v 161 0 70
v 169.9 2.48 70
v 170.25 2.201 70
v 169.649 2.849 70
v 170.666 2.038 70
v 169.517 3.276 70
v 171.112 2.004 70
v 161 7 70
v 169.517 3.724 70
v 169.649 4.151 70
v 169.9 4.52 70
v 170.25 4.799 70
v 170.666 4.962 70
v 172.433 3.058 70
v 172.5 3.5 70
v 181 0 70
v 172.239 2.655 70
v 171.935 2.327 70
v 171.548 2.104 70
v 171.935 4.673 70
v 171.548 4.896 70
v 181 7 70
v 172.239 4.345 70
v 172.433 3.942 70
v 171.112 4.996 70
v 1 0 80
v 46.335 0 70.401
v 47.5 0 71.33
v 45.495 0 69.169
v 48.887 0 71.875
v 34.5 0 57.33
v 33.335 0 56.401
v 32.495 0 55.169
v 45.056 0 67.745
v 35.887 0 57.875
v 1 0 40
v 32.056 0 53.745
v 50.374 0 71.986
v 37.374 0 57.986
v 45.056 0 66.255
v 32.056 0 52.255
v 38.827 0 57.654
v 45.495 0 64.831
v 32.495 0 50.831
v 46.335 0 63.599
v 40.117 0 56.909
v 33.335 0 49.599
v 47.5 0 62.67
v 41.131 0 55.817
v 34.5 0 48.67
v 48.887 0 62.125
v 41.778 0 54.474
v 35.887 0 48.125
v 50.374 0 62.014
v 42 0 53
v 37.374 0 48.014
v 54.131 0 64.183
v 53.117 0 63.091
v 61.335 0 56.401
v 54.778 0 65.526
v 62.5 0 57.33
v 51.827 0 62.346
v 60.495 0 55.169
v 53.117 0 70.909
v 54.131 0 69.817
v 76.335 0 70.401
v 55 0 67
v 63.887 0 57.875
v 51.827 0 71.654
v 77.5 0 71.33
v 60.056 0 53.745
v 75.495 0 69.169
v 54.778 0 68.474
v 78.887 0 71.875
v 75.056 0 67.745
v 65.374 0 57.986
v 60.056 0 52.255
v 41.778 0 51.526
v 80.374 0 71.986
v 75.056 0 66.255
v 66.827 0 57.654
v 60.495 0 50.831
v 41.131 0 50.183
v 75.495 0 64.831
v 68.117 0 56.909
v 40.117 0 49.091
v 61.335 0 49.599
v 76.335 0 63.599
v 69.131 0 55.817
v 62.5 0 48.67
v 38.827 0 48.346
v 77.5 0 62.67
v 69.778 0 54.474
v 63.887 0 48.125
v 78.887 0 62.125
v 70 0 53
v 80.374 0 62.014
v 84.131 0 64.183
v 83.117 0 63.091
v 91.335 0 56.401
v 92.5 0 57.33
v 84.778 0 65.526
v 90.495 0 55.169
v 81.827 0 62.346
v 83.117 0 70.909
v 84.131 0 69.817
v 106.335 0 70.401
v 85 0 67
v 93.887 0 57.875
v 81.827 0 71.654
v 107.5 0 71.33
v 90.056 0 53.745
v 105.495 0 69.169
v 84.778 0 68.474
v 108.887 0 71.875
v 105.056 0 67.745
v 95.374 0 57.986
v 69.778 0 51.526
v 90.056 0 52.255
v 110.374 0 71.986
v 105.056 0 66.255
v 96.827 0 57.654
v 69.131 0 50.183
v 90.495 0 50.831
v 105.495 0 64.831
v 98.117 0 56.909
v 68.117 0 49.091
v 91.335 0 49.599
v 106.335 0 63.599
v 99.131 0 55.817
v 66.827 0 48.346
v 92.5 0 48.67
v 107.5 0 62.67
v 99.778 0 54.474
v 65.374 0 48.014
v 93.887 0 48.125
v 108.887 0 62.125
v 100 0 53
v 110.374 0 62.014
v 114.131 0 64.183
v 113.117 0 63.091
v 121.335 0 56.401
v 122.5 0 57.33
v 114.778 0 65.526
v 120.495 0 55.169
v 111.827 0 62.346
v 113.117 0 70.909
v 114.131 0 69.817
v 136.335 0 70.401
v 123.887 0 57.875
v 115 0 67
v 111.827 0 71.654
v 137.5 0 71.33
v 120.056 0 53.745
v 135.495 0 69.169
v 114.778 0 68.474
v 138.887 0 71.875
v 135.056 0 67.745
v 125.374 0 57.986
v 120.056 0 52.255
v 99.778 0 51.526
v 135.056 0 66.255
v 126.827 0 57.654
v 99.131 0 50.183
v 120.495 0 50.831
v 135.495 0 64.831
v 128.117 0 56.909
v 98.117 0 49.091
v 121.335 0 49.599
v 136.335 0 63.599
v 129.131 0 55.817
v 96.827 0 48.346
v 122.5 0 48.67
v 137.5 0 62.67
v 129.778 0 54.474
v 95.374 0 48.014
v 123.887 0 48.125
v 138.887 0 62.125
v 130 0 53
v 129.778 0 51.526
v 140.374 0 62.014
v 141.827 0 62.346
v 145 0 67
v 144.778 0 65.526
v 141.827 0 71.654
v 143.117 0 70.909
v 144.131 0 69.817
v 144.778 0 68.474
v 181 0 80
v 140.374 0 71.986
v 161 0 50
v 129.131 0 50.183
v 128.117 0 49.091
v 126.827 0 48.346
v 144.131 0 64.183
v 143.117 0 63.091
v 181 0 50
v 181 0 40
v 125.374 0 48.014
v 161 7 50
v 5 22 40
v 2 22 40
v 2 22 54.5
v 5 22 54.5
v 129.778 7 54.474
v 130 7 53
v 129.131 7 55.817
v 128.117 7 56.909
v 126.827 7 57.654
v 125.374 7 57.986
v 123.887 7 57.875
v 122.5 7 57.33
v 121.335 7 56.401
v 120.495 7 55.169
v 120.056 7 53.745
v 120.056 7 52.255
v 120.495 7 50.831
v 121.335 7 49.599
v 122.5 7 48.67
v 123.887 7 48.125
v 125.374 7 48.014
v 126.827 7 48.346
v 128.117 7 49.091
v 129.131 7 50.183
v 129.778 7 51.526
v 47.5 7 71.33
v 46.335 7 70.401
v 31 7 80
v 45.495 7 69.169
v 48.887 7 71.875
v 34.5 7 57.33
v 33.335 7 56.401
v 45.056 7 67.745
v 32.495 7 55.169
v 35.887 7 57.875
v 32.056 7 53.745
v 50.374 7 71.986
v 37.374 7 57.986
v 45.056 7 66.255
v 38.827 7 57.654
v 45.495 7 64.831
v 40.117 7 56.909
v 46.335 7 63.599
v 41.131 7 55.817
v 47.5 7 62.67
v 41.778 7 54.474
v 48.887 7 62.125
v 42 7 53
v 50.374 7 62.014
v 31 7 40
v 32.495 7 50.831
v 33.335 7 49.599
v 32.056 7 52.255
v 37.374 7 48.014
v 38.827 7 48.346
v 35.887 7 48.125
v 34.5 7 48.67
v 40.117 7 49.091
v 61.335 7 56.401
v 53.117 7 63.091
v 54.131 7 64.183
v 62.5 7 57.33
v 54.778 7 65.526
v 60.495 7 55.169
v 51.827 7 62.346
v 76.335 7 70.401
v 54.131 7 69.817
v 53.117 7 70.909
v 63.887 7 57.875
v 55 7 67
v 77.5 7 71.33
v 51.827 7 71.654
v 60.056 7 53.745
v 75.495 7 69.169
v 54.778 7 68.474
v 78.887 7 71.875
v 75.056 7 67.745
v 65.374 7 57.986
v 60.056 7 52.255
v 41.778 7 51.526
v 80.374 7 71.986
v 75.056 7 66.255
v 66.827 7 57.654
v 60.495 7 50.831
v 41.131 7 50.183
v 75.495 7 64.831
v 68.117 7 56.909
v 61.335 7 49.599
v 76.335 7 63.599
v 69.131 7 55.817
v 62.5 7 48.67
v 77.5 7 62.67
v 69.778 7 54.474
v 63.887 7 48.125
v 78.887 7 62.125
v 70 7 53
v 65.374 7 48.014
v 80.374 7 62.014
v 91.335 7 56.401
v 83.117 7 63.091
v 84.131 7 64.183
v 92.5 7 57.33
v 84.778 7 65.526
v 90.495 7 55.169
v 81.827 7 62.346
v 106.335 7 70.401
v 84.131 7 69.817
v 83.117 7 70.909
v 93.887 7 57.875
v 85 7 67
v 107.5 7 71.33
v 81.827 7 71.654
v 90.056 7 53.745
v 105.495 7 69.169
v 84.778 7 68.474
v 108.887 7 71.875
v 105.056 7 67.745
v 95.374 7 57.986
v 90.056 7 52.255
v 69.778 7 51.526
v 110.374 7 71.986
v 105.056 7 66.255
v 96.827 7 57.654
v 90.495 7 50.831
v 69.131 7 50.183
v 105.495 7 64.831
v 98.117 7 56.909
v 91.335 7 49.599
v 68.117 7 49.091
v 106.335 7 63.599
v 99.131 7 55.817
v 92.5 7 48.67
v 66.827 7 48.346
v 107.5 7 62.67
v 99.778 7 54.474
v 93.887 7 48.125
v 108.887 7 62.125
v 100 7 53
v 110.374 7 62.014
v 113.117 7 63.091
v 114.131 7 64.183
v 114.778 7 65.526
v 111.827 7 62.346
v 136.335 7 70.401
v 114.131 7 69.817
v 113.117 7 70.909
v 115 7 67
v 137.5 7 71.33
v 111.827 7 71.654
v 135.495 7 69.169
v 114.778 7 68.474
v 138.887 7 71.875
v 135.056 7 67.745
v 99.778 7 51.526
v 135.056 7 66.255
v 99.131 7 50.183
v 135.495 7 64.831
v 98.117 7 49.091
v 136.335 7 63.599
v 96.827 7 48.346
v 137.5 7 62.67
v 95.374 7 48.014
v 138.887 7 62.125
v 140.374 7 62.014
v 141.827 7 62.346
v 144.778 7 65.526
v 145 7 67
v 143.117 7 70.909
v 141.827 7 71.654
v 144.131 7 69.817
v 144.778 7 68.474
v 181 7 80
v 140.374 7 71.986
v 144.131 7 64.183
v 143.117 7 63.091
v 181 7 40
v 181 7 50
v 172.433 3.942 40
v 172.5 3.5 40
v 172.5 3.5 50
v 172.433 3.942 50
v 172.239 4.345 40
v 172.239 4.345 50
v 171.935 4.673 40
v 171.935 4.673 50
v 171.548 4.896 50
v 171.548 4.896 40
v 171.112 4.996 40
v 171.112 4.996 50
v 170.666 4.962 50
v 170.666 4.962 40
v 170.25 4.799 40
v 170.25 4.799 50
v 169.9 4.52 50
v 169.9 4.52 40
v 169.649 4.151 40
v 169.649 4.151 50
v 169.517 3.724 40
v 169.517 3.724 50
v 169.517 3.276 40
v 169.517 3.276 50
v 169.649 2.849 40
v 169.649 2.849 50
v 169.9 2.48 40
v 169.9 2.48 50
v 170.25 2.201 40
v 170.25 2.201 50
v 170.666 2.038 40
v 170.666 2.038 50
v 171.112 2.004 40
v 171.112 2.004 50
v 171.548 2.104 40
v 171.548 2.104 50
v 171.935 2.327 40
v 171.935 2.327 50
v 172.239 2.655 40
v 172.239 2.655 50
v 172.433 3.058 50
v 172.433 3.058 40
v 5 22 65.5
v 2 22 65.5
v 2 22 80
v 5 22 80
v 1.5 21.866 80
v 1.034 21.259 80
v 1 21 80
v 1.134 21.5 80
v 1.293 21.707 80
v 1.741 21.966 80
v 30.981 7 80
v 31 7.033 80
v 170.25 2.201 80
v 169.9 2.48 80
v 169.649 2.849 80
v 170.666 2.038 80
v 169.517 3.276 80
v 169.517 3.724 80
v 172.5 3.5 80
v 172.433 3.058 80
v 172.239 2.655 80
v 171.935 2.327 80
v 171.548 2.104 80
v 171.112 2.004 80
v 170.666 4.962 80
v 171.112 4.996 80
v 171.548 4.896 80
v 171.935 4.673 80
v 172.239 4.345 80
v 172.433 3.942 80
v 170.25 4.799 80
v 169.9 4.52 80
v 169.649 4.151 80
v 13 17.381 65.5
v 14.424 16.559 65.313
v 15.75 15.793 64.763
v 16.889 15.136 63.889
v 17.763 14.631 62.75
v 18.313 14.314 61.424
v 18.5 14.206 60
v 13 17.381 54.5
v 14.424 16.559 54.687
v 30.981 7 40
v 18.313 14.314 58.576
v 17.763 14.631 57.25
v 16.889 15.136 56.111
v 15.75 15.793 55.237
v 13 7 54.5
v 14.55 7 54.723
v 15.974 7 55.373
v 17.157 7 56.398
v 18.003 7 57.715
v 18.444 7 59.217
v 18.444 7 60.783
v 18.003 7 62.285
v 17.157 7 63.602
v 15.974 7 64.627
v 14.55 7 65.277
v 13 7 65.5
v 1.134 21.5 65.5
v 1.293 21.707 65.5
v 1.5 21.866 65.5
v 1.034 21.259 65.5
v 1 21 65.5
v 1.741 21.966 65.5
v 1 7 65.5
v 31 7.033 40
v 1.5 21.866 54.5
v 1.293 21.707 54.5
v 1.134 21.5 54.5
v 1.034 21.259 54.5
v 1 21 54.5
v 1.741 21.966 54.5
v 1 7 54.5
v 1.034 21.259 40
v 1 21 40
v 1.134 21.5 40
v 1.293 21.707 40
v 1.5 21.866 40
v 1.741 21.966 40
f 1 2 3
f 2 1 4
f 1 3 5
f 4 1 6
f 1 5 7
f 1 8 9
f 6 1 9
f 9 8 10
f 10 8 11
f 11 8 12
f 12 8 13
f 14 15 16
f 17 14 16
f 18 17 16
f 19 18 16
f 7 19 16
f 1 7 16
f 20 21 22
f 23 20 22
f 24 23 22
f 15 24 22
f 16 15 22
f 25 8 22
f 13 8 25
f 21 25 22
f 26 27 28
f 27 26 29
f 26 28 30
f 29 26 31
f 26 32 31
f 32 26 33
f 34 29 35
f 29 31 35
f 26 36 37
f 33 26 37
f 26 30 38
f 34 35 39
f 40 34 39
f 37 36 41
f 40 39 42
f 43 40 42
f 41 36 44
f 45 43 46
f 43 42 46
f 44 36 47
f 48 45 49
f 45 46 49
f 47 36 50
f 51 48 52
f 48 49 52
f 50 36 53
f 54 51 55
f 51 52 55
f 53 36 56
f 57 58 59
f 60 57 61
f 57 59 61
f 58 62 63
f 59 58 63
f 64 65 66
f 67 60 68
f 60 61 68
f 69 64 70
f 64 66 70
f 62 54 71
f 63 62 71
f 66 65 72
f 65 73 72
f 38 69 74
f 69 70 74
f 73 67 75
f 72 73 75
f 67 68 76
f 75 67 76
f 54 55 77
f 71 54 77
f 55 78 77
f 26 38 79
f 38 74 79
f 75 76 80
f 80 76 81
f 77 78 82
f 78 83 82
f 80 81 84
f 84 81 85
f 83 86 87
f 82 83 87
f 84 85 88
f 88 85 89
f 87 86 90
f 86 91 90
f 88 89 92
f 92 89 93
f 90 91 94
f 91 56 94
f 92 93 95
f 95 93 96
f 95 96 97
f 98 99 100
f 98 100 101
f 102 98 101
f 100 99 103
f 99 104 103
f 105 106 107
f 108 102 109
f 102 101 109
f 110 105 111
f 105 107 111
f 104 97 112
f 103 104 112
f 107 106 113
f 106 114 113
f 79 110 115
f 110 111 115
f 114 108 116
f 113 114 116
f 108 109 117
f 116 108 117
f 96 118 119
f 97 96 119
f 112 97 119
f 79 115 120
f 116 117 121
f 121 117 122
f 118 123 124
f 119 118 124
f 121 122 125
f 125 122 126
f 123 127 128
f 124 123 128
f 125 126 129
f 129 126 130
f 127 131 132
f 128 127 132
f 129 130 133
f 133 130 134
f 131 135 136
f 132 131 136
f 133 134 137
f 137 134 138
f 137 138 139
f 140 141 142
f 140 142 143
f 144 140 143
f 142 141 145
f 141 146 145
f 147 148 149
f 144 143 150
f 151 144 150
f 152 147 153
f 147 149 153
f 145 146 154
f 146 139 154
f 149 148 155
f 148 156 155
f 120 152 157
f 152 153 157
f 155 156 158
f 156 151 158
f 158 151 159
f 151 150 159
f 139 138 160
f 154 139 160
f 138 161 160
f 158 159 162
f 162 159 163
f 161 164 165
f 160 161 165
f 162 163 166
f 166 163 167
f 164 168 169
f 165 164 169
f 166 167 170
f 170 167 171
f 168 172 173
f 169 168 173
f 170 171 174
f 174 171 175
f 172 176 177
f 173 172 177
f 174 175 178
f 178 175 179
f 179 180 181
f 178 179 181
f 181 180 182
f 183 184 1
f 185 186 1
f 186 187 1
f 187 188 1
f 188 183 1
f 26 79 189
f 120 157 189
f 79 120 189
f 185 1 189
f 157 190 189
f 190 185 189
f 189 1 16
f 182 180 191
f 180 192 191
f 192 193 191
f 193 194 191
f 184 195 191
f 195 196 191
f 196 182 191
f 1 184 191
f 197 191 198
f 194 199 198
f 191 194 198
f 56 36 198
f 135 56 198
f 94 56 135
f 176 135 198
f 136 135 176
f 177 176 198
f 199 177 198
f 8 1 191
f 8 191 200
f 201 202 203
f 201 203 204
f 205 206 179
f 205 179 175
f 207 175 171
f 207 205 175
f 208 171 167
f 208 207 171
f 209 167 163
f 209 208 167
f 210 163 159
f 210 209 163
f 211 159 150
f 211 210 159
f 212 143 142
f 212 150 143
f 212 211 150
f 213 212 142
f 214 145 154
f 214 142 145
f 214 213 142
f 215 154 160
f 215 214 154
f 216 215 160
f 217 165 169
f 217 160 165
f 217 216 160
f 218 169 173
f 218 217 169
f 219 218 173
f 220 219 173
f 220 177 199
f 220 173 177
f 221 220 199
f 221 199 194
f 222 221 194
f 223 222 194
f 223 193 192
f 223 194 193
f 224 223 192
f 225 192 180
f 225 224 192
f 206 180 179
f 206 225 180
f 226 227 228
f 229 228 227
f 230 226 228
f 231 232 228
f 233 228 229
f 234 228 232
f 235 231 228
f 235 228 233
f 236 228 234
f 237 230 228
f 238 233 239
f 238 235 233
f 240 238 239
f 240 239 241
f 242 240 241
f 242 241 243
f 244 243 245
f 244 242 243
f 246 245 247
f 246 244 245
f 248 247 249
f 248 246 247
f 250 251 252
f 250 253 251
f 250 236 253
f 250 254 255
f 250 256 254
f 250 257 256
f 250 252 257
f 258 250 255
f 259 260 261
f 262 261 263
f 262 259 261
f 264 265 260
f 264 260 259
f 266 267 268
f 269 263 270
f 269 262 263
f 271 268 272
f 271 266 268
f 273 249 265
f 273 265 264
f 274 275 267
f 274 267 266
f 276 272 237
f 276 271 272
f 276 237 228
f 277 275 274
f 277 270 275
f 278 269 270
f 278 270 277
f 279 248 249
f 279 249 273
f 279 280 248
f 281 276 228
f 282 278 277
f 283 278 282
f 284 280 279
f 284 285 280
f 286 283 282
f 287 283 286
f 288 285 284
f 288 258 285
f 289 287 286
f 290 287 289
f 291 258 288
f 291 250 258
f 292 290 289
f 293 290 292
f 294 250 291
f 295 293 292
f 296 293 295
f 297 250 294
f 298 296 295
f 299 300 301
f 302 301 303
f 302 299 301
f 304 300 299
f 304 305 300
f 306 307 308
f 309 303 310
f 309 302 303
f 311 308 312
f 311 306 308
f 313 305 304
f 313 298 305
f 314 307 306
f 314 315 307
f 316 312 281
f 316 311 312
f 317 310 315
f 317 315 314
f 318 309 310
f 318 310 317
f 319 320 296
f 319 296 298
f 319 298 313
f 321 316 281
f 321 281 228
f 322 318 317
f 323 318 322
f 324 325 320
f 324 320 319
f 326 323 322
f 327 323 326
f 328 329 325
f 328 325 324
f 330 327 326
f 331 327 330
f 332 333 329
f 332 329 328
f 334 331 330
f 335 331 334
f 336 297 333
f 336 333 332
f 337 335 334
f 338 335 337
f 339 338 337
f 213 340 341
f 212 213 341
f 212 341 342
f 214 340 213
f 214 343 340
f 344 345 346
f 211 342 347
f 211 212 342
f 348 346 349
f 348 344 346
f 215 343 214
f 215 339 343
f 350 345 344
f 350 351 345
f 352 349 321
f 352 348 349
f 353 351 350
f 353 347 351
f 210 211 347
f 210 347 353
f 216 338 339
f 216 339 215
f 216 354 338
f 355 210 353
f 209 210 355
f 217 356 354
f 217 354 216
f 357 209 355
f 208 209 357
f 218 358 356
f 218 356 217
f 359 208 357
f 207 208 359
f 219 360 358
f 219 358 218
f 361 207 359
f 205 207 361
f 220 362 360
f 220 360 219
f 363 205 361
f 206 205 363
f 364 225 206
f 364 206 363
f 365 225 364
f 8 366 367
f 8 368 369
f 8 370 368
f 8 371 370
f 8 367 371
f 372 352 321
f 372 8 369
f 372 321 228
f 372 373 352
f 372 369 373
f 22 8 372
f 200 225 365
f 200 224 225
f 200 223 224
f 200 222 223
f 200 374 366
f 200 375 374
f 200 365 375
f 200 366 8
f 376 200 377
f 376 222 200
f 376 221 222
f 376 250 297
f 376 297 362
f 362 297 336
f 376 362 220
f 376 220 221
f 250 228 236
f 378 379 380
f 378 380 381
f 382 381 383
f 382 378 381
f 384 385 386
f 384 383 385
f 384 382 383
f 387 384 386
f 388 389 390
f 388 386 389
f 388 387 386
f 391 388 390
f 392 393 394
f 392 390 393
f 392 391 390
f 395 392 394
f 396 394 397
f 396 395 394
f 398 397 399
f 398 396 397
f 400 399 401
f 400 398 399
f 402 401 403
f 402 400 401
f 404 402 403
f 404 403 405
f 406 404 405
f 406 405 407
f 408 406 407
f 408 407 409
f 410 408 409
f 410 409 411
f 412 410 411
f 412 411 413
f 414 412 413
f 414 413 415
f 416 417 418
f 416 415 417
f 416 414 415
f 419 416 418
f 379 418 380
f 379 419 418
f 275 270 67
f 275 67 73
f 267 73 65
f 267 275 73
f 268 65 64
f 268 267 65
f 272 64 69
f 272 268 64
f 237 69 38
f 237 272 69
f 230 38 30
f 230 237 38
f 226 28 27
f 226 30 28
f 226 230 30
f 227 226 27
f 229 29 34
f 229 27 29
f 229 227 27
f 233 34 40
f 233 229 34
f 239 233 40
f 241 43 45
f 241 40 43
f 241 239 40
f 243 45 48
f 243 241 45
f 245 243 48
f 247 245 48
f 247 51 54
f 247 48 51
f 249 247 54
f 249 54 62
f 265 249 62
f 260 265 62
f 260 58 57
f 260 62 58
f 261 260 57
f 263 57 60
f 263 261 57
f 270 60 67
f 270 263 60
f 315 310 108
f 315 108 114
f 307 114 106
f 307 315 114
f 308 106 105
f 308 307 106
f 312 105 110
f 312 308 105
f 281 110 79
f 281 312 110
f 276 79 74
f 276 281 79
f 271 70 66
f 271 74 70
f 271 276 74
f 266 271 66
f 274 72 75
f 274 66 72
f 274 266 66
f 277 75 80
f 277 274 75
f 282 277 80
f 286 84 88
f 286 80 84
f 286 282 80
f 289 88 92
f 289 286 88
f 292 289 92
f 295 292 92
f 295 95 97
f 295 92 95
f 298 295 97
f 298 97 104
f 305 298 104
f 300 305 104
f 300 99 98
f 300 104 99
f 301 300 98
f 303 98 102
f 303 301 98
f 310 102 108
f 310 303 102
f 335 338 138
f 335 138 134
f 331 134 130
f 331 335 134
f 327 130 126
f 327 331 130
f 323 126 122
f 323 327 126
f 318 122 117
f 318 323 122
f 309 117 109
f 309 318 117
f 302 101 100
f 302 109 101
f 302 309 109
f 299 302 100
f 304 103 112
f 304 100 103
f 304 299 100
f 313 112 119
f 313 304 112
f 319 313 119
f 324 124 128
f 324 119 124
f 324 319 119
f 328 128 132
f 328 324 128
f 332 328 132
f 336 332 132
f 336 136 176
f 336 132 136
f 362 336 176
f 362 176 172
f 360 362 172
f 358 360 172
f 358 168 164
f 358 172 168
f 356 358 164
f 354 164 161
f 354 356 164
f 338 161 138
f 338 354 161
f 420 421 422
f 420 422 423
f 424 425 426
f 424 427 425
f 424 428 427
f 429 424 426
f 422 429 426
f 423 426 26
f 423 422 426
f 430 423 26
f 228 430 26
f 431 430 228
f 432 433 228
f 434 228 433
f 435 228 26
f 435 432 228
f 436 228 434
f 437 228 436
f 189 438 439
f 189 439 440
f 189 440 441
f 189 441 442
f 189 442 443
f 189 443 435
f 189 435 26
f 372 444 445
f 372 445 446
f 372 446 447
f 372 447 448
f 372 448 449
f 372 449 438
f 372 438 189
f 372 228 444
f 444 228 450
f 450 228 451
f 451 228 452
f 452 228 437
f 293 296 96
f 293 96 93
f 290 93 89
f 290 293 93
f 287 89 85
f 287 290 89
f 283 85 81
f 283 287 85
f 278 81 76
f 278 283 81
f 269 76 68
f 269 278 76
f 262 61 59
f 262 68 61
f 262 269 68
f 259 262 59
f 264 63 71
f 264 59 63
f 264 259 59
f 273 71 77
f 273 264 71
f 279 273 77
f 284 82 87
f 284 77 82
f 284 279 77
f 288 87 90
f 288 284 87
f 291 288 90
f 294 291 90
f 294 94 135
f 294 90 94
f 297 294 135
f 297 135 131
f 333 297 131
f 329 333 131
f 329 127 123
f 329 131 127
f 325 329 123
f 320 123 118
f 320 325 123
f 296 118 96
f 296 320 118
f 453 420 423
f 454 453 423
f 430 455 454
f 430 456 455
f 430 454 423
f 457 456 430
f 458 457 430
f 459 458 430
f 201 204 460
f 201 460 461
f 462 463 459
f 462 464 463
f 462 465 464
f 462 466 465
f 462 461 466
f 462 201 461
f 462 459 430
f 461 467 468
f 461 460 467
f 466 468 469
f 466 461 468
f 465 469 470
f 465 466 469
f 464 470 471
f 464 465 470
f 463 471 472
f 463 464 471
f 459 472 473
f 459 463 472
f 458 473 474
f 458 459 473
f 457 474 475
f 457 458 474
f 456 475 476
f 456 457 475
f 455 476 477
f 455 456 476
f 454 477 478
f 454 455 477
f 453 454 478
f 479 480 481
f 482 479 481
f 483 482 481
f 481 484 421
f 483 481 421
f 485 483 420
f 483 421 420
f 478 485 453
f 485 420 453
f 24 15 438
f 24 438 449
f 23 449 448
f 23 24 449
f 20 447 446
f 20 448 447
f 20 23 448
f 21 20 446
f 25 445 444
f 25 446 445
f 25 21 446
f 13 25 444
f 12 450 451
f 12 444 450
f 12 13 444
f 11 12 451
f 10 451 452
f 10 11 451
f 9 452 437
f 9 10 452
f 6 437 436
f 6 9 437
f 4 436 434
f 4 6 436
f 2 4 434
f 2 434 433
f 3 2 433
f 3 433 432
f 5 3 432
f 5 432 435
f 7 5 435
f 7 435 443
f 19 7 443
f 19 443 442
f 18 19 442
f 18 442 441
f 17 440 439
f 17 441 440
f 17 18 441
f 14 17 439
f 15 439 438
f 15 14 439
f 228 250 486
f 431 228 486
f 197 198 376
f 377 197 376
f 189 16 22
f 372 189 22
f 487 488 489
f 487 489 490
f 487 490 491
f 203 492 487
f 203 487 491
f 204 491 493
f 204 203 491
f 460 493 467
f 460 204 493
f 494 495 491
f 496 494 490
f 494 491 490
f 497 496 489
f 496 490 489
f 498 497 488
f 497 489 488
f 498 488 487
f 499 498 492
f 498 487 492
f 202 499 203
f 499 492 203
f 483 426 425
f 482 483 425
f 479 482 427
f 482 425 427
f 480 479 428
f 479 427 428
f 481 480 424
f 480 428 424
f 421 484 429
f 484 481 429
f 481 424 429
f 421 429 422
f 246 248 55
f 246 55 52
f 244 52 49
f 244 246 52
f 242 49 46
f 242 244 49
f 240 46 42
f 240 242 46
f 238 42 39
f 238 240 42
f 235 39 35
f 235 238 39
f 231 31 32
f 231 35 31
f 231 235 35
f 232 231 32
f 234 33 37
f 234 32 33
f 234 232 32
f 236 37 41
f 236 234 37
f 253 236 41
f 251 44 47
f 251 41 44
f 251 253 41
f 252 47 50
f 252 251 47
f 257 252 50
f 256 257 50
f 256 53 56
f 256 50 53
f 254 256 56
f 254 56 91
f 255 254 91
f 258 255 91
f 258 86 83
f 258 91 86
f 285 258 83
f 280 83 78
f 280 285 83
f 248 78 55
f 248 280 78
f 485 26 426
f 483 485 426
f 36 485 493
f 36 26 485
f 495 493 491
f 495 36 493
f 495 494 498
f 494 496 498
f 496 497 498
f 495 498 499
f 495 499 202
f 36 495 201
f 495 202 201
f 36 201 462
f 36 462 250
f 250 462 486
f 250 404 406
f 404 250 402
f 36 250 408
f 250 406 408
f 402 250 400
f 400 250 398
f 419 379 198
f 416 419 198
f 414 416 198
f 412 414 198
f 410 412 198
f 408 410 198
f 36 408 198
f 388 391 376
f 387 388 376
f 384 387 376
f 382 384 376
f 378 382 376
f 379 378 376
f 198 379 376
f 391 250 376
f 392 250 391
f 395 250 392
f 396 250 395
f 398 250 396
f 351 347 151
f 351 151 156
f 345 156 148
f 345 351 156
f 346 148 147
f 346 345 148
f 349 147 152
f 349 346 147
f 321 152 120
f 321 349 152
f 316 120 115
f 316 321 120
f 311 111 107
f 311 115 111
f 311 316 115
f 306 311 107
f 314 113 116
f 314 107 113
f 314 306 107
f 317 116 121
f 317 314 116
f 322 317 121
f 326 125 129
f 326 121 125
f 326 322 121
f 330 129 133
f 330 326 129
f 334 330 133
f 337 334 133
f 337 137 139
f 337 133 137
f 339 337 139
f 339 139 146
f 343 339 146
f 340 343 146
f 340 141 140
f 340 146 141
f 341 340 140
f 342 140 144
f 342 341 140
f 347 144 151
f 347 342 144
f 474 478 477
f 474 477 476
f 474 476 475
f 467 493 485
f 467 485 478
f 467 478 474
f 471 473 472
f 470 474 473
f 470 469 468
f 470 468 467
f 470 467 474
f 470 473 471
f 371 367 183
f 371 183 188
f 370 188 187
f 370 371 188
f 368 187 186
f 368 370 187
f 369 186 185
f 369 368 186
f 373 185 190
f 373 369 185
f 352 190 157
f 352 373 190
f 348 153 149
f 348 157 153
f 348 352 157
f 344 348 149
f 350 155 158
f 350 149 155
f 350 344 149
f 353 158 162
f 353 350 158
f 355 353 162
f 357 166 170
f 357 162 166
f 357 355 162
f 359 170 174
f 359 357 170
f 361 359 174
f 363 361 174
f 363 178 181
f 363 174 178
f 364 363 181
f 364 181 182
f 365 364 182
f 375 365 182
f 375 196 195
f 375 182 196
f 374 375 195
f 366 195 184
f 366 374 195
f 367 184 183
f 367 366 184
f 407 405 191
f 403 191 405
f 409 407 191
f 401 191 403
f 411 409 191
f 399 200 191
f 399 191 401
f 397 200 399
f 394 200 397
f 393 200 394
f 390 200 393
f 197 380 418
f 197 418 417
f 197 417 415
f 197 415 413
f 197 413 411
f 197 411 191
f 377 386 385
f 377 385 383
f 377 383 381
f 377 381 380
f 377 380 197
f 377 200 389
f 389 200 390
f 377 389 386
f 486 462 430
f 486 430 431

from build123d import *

# Parameters (mm, degrees)
CYLINDER009_R          = 5
CYLINDER009_DEPTH      = 20
CYLINDER009_ROLL_ANGLE = 90
CYLINDER008_R          = 5
CYLINDER008_DEPTH      = 20
CYLINDER008_ROLL_ANGLE = 90
CYLINDER007_R          = 5
CYLINDER007_DEPTH      = 20
CYLINDER007_ROLL_ANGLE = 90
CYLINDER006_R          = 5
CYLINDER006_DEPTH      = 20
CYLINDER006_ROLL_ANGLE = 90
CYLINDER005_R          = 5
CYLINDER005_DEPTH      = 20
CYLINDER005_ROLL_ANGLE = 90
CYLINDER004_R          = 5
CYLINDER004_DEPTH      = 20
CYLINDER004_ROLL_ANGLE = 90
CYLINDER002_R          = 5
CYLINDER002_DEPTH      = 20
CYLINDER002_ROLL_ANGLE = 90
CYLINDER003_R          = 5
CYLINDER003_DEPTH      = 20
CYLINDER003_ROLL_ANGLE = 90
CYLINDER_R             = 1.5
CYLINDER_DEPTH         = 50
BOX003_W               = 20
BOX003_H               = 10
BOX003_DEPTH           = 20
BOX_W                  = 180
BOX_H                  = 7
BOX_DEPTH              = 40
BOX004_W               = 40
BOX004_H               = 20
BOX004_DEPTH           = 11
CYLINDER001_R          = 5.5
CYLINDER001_DEPTH      = 28
CYLINDER001_ROLL_ANGLE = 90
BOX002_W               = 30
BOX002_H               = 15
BOX002_DEPTH           = 40
BOX002_PLACEMENT_ANGLE = 30
BOX001_W               = 30
BOX001_H               = 15
BOX001_DEPTH           = 40
FILLET_R               = 1


with BuildPart() as cilindro008:
    # Cylinder009 → Cylinder009 (new body)
    with BuildSketch(Plane.XY):
        Circle(CYLINDER009_R)
    extrude(amount=CYLINDER009_DEPTH)


with BuildPart() as cilindro008_1:
    # Cylinder009 roll: moved
    add(cilindro008.part.rotate(Axis((0, 0, 0), (1, 0, 0)), CYLINDER009_ROLL_ANGLE))


with BuildPart() as cilindro008_2:
    # Cylinder009 placement: moved
    add(cilindro008_1.part.moved(Location((37, 15, 53))))


with BuildPart() as cilindro007:
    # Cylinder008 → Cylinder008 (new body)
    with BuildSketch(Plane.XY):
        Circle(CYLINDER008_R)
    extrude(amount=CYLINDER008_DEPTH)


with BuildPart() as cilindro007_1:
    # Cylinder008 roll: moved
    add(cilindro007.part.rotate(Axis((0, 0, 0), (1, 0, 0)), CYLINDER008_ROLL_ANGLE))


with BuildPart() as cilindro007_2:
    # Cylinder008 placement: moved
    add(cilindro007_1.part.moved(Location((50, 15, 67))))


with BuildPart() as cilindro006:
    # Cylinder007 → Cylinder007 (new body)
    with BuildSketch(Plane.XY):
        Circle(CYLINDER007_R)
    extrude(amount=CYLINDER007_DEPTH)


with BuildPart() as cilindro006_1:
    # Cylinder007 roll: moved
    add(cilindro006.part.rotate(Axis((0, 0, 0), (1, 0, 0)), CYLINDER007_ROLL_ANGLE))


with BuildPart() as cilindro006_2:
    # Cylinder007 placement: moved
    add(cilindro006_1.part.moved(Location((65, 15, 53))))


with BuildPart() as cilindro005:
    # Cylinder006 → Cylinder006 (new body)
    with BuildSketch(Plane.XY):
        Circle(CYLINDER006_R)
    extrude(amount=CYLINDER006_DEPTH)


with BuildPart() as cilindro005_1:
    # Cylinder006 roll: moved
    add(cilindro005.part.rotate(Axis((0, 0, 0), (1, 0, 0)), CYLINDER006_ROLL_ANGLE))


with BuildPart() as cilindro005_2:
    # Cylinder006 placement: moved
    add(cilindro005_1.part.moved(Location((80, 15, 67))))


with BuildPart() as cilindro004:
    # Cylinder005 → Cylinder005 (new body)
    with BuildSketch(Plane.XY):
        Circle(CYLINDER005_R)
    extrude(amount=CYLINDER005_DEPTH)


with BuildPart() as cilindro004_1:
    # Cylinder005 roll: moved
    add(cilindro004.part.rotate(Axis((0, 0, 0), (1, 0, 0)), CYLINDER005_ROLL_ANGLE))


with BuildPart() as cilindro004_2:
    # Cylinder005 placement: moved
    add(cilindro004_1.part.moved(Location((95, 15, 53))))


with BuildPart() as cilindro003:
    # Cylinder004 → Cylinder004 (new body)
    with BuildSketch(Plane.XY):
        Circle(CYLINDER004_R)
    extrude(amount=CYLINDER004_DEPTH)


with BuildPart() as cilindro003_1:
    # Cylinder004 roll: moved
    add(cilindro003.part.rotate(Axis((0, 0, 0), (1, 0, 0)), CYLINDER004_ROLL_ANGLE))


with BuildPart() as cilindro003_2:
    # Cylinder004 placement: moved
    add(cilindro003_1.part.moved(Location((110, 15, 67))))


with BuildPart() as cilindro001:
    # Cylinder002 → Cylinder002 (new body)
    with BuildSketch(Plane.XY):
        Circle(CYLINDER002_R)
    extrude(amount=CYLINDER002_DEPTH)


with BuildPart() as cilindro001_1:
    # Cylinder002 roll: moved
    add(cilindro001.part.rotate(Axis((0, 0, 0), (1, 0, 0)), CYLINDER002_ROLL_ANGLE))


with BuildPart() as cilindro001_2:
    # Cylinder002 placement: moved
    add(cilindro001_1.part.moved(Location((125, 15, 53))))


with BuildPart() as cilindro002:
    # Cylinder003 → Cylinder003 (new body)
    with BuildSketch(Plane.XY):
        Circle(CYLINDER003_R)
    extrude(amount=CYLINDER003_DEPTH)


with BuildPart() as cilindro002_1:
    # Cylinder003 roll: moved
    add(cilindro002.part.rotate(Axis((0, 0, 0), (1, 0, 0)), CYLINDER003_ROLL_ANGLE))


with BuildPart() as cilindro002_2:
    # Cylinder003 placement: moved
    add(cilindro002_1.part.moved(Location((140, 15, 67))))


with BuildPart() as agujero_tornillo:
    # Cylinder → Cylinder (new body)
    with BuildSketch(Plane(origin=(170, 3.5, 35), x_dir=(1, 0, 0), z_dir=(0, 0, 1))):
        Circle(CYLINDER_R)
    extrude(amount=CYLINDER_DEPTH)


with BuildPart() as cubo:
    # Box003 → Box003 (new body)
    with BuildSketch(Plane(origin=(160, 0, 50), x_dir=(1, 0, 0), z_dir=(0, 0, 1))):
        with Locations((10, 5)):
            Rectangle(BOX003_W, BOX003_H)
    extrude(amount=BOX003_DEPTH)


with BuildPart() as cut012:
    # Box → Box (new body)
    with BuildSketch(Plane.XY.offset(40)):
        with Locations((90, 3.5)):
            Rectangle(BOX_W, BOX_H)
    extrude(amount=BOX_DEPTH)

    # Cut001: cut Cubo
    add(cubo.part, mode=Mode.SUBTRACT)

    # Cut002: cut Agujero tornillo
    add(agujero_tornillo.part, mode=Mode.SUBTRACT)


with BuildPart() as cut012_1:
    # Cut002 placement: moved
    add(cut012.part.moved(Location((1, 0, 0))))

    # Cut005: cut Cilindro002
    add(cilindro002_2.part, mode=Mode.SUBTRACT)

    # Cut006: cut Cilindro001
    add(cilindro001_2.part, mode=Mode.SUBTRACT)

    # Cut007: cut Cilindro003
    add(cilindro003_2.part, mode=Mode.SUBTRACT)

    # Cut008: cut Cilindro004
    add(cilindro004_2.part, mode=Mode.SUBTRACT)

    # Cut009: cut Cilindro005
    add(cilindro005_2.part, mode=Mode.SUBTRACT)

    # Cut010: cut Cilindro006
    add(cilindro006_2.part, mode=Mode.SUBTRACT)

    # Cut011: cut Cilindro007
    add(cilindro007_2.part, mode=Mode.SUBTRACT)

    # Cut012: cut Cilindro008
    add(cilindro008_2.part, mode=Mode.SUBTRACT)


with BuildPart() as cubo001:
    # Box004 → Box004 (new body)
    with BuildSketch(Plane(origin=(-28, 7, 54.5), x_dir=(1, 0, 0), z_dir=(0, 0, 1))):
        with Locations((20, 10)):
            Rectangle(BOX004_W, BOX004_H)
    extrude(amount=BOX004_DEPTH)


with BuildPart() as cilindro:
    # Cylinder001 → Cylinder001 (new body)
    with BuildSketch(Plane.XY):
        Circle(CYLINDER001_R)
    extrude(amount=CYLINDER001_DEPTH)


with BuildPart() as cilindro_1:
    # Cylinder001 roll: moved
    add(cilindro.part.rotate(Axis((0, 0, 0), (1, 0, 0)), CYLINDER001_ROLL_ANGLE))


with BuildPart() as cilindro_2:
    # Cylinder001 placement: moved
    add(cilindro_1.part.moved(Location((12, 33, 60))))


with BuildPart() as cu_a001:
    # Box002 → Box002 (new body)
    with BuildSketch(Plane.XY):
        with Locations((15, 7.5)):
            Rectangle(BOX002_W, BOX002_H)
    extrude(amount=BOX002_DEPTH)


with BuildPart() as cu_a001_1:
    # Box002 placement: moved
    add(cu_a001.part.moved(Location((4, 22, 40))).rotate(Axis((4, 22, 40), (0, 0, -1)), BOX002_PLACEMENT_ANGLE))


with BuildPart() as fusion:
    # Box001 → Box001 (new body)
    with BuildSketch(Plane(origin=(0, 7, 40), x_dir=(1, 0, 0), z_dir=(0, 0, 1))):
        with Locations((15, 7.5)):
            Rectangle(BOX001_W, BOX001_H)
    extrude(amount=BOX001_DEPTH)

    # Cut: cut cuña001
    add(cu_a001_1.part, mode=Mode.SUBTRACT)

    # Fillet
    fillet_edges = [fusion.edges().sort_by_distance(p)[0] for p in [
        (0, 22, 60),
    ]]
    fillet(fillet_edges, radius=FILLET_R)

    # Cut003: cut Cilindro
    add(cilindro_2.part, mode=Mode.SUBTRACT)

    # Cut004: cut Cubo001
    add(cubo001.part, mode=Mode.SUBTRACT)


with BuildPart() as fusion_1:
    # Cut004 placement: moved
    add(fusion.part.moved(Location((1, 0, 0))))

    # Fusion: union Cut012
    add(cut012_1.part)


solid = fusion_1.part
